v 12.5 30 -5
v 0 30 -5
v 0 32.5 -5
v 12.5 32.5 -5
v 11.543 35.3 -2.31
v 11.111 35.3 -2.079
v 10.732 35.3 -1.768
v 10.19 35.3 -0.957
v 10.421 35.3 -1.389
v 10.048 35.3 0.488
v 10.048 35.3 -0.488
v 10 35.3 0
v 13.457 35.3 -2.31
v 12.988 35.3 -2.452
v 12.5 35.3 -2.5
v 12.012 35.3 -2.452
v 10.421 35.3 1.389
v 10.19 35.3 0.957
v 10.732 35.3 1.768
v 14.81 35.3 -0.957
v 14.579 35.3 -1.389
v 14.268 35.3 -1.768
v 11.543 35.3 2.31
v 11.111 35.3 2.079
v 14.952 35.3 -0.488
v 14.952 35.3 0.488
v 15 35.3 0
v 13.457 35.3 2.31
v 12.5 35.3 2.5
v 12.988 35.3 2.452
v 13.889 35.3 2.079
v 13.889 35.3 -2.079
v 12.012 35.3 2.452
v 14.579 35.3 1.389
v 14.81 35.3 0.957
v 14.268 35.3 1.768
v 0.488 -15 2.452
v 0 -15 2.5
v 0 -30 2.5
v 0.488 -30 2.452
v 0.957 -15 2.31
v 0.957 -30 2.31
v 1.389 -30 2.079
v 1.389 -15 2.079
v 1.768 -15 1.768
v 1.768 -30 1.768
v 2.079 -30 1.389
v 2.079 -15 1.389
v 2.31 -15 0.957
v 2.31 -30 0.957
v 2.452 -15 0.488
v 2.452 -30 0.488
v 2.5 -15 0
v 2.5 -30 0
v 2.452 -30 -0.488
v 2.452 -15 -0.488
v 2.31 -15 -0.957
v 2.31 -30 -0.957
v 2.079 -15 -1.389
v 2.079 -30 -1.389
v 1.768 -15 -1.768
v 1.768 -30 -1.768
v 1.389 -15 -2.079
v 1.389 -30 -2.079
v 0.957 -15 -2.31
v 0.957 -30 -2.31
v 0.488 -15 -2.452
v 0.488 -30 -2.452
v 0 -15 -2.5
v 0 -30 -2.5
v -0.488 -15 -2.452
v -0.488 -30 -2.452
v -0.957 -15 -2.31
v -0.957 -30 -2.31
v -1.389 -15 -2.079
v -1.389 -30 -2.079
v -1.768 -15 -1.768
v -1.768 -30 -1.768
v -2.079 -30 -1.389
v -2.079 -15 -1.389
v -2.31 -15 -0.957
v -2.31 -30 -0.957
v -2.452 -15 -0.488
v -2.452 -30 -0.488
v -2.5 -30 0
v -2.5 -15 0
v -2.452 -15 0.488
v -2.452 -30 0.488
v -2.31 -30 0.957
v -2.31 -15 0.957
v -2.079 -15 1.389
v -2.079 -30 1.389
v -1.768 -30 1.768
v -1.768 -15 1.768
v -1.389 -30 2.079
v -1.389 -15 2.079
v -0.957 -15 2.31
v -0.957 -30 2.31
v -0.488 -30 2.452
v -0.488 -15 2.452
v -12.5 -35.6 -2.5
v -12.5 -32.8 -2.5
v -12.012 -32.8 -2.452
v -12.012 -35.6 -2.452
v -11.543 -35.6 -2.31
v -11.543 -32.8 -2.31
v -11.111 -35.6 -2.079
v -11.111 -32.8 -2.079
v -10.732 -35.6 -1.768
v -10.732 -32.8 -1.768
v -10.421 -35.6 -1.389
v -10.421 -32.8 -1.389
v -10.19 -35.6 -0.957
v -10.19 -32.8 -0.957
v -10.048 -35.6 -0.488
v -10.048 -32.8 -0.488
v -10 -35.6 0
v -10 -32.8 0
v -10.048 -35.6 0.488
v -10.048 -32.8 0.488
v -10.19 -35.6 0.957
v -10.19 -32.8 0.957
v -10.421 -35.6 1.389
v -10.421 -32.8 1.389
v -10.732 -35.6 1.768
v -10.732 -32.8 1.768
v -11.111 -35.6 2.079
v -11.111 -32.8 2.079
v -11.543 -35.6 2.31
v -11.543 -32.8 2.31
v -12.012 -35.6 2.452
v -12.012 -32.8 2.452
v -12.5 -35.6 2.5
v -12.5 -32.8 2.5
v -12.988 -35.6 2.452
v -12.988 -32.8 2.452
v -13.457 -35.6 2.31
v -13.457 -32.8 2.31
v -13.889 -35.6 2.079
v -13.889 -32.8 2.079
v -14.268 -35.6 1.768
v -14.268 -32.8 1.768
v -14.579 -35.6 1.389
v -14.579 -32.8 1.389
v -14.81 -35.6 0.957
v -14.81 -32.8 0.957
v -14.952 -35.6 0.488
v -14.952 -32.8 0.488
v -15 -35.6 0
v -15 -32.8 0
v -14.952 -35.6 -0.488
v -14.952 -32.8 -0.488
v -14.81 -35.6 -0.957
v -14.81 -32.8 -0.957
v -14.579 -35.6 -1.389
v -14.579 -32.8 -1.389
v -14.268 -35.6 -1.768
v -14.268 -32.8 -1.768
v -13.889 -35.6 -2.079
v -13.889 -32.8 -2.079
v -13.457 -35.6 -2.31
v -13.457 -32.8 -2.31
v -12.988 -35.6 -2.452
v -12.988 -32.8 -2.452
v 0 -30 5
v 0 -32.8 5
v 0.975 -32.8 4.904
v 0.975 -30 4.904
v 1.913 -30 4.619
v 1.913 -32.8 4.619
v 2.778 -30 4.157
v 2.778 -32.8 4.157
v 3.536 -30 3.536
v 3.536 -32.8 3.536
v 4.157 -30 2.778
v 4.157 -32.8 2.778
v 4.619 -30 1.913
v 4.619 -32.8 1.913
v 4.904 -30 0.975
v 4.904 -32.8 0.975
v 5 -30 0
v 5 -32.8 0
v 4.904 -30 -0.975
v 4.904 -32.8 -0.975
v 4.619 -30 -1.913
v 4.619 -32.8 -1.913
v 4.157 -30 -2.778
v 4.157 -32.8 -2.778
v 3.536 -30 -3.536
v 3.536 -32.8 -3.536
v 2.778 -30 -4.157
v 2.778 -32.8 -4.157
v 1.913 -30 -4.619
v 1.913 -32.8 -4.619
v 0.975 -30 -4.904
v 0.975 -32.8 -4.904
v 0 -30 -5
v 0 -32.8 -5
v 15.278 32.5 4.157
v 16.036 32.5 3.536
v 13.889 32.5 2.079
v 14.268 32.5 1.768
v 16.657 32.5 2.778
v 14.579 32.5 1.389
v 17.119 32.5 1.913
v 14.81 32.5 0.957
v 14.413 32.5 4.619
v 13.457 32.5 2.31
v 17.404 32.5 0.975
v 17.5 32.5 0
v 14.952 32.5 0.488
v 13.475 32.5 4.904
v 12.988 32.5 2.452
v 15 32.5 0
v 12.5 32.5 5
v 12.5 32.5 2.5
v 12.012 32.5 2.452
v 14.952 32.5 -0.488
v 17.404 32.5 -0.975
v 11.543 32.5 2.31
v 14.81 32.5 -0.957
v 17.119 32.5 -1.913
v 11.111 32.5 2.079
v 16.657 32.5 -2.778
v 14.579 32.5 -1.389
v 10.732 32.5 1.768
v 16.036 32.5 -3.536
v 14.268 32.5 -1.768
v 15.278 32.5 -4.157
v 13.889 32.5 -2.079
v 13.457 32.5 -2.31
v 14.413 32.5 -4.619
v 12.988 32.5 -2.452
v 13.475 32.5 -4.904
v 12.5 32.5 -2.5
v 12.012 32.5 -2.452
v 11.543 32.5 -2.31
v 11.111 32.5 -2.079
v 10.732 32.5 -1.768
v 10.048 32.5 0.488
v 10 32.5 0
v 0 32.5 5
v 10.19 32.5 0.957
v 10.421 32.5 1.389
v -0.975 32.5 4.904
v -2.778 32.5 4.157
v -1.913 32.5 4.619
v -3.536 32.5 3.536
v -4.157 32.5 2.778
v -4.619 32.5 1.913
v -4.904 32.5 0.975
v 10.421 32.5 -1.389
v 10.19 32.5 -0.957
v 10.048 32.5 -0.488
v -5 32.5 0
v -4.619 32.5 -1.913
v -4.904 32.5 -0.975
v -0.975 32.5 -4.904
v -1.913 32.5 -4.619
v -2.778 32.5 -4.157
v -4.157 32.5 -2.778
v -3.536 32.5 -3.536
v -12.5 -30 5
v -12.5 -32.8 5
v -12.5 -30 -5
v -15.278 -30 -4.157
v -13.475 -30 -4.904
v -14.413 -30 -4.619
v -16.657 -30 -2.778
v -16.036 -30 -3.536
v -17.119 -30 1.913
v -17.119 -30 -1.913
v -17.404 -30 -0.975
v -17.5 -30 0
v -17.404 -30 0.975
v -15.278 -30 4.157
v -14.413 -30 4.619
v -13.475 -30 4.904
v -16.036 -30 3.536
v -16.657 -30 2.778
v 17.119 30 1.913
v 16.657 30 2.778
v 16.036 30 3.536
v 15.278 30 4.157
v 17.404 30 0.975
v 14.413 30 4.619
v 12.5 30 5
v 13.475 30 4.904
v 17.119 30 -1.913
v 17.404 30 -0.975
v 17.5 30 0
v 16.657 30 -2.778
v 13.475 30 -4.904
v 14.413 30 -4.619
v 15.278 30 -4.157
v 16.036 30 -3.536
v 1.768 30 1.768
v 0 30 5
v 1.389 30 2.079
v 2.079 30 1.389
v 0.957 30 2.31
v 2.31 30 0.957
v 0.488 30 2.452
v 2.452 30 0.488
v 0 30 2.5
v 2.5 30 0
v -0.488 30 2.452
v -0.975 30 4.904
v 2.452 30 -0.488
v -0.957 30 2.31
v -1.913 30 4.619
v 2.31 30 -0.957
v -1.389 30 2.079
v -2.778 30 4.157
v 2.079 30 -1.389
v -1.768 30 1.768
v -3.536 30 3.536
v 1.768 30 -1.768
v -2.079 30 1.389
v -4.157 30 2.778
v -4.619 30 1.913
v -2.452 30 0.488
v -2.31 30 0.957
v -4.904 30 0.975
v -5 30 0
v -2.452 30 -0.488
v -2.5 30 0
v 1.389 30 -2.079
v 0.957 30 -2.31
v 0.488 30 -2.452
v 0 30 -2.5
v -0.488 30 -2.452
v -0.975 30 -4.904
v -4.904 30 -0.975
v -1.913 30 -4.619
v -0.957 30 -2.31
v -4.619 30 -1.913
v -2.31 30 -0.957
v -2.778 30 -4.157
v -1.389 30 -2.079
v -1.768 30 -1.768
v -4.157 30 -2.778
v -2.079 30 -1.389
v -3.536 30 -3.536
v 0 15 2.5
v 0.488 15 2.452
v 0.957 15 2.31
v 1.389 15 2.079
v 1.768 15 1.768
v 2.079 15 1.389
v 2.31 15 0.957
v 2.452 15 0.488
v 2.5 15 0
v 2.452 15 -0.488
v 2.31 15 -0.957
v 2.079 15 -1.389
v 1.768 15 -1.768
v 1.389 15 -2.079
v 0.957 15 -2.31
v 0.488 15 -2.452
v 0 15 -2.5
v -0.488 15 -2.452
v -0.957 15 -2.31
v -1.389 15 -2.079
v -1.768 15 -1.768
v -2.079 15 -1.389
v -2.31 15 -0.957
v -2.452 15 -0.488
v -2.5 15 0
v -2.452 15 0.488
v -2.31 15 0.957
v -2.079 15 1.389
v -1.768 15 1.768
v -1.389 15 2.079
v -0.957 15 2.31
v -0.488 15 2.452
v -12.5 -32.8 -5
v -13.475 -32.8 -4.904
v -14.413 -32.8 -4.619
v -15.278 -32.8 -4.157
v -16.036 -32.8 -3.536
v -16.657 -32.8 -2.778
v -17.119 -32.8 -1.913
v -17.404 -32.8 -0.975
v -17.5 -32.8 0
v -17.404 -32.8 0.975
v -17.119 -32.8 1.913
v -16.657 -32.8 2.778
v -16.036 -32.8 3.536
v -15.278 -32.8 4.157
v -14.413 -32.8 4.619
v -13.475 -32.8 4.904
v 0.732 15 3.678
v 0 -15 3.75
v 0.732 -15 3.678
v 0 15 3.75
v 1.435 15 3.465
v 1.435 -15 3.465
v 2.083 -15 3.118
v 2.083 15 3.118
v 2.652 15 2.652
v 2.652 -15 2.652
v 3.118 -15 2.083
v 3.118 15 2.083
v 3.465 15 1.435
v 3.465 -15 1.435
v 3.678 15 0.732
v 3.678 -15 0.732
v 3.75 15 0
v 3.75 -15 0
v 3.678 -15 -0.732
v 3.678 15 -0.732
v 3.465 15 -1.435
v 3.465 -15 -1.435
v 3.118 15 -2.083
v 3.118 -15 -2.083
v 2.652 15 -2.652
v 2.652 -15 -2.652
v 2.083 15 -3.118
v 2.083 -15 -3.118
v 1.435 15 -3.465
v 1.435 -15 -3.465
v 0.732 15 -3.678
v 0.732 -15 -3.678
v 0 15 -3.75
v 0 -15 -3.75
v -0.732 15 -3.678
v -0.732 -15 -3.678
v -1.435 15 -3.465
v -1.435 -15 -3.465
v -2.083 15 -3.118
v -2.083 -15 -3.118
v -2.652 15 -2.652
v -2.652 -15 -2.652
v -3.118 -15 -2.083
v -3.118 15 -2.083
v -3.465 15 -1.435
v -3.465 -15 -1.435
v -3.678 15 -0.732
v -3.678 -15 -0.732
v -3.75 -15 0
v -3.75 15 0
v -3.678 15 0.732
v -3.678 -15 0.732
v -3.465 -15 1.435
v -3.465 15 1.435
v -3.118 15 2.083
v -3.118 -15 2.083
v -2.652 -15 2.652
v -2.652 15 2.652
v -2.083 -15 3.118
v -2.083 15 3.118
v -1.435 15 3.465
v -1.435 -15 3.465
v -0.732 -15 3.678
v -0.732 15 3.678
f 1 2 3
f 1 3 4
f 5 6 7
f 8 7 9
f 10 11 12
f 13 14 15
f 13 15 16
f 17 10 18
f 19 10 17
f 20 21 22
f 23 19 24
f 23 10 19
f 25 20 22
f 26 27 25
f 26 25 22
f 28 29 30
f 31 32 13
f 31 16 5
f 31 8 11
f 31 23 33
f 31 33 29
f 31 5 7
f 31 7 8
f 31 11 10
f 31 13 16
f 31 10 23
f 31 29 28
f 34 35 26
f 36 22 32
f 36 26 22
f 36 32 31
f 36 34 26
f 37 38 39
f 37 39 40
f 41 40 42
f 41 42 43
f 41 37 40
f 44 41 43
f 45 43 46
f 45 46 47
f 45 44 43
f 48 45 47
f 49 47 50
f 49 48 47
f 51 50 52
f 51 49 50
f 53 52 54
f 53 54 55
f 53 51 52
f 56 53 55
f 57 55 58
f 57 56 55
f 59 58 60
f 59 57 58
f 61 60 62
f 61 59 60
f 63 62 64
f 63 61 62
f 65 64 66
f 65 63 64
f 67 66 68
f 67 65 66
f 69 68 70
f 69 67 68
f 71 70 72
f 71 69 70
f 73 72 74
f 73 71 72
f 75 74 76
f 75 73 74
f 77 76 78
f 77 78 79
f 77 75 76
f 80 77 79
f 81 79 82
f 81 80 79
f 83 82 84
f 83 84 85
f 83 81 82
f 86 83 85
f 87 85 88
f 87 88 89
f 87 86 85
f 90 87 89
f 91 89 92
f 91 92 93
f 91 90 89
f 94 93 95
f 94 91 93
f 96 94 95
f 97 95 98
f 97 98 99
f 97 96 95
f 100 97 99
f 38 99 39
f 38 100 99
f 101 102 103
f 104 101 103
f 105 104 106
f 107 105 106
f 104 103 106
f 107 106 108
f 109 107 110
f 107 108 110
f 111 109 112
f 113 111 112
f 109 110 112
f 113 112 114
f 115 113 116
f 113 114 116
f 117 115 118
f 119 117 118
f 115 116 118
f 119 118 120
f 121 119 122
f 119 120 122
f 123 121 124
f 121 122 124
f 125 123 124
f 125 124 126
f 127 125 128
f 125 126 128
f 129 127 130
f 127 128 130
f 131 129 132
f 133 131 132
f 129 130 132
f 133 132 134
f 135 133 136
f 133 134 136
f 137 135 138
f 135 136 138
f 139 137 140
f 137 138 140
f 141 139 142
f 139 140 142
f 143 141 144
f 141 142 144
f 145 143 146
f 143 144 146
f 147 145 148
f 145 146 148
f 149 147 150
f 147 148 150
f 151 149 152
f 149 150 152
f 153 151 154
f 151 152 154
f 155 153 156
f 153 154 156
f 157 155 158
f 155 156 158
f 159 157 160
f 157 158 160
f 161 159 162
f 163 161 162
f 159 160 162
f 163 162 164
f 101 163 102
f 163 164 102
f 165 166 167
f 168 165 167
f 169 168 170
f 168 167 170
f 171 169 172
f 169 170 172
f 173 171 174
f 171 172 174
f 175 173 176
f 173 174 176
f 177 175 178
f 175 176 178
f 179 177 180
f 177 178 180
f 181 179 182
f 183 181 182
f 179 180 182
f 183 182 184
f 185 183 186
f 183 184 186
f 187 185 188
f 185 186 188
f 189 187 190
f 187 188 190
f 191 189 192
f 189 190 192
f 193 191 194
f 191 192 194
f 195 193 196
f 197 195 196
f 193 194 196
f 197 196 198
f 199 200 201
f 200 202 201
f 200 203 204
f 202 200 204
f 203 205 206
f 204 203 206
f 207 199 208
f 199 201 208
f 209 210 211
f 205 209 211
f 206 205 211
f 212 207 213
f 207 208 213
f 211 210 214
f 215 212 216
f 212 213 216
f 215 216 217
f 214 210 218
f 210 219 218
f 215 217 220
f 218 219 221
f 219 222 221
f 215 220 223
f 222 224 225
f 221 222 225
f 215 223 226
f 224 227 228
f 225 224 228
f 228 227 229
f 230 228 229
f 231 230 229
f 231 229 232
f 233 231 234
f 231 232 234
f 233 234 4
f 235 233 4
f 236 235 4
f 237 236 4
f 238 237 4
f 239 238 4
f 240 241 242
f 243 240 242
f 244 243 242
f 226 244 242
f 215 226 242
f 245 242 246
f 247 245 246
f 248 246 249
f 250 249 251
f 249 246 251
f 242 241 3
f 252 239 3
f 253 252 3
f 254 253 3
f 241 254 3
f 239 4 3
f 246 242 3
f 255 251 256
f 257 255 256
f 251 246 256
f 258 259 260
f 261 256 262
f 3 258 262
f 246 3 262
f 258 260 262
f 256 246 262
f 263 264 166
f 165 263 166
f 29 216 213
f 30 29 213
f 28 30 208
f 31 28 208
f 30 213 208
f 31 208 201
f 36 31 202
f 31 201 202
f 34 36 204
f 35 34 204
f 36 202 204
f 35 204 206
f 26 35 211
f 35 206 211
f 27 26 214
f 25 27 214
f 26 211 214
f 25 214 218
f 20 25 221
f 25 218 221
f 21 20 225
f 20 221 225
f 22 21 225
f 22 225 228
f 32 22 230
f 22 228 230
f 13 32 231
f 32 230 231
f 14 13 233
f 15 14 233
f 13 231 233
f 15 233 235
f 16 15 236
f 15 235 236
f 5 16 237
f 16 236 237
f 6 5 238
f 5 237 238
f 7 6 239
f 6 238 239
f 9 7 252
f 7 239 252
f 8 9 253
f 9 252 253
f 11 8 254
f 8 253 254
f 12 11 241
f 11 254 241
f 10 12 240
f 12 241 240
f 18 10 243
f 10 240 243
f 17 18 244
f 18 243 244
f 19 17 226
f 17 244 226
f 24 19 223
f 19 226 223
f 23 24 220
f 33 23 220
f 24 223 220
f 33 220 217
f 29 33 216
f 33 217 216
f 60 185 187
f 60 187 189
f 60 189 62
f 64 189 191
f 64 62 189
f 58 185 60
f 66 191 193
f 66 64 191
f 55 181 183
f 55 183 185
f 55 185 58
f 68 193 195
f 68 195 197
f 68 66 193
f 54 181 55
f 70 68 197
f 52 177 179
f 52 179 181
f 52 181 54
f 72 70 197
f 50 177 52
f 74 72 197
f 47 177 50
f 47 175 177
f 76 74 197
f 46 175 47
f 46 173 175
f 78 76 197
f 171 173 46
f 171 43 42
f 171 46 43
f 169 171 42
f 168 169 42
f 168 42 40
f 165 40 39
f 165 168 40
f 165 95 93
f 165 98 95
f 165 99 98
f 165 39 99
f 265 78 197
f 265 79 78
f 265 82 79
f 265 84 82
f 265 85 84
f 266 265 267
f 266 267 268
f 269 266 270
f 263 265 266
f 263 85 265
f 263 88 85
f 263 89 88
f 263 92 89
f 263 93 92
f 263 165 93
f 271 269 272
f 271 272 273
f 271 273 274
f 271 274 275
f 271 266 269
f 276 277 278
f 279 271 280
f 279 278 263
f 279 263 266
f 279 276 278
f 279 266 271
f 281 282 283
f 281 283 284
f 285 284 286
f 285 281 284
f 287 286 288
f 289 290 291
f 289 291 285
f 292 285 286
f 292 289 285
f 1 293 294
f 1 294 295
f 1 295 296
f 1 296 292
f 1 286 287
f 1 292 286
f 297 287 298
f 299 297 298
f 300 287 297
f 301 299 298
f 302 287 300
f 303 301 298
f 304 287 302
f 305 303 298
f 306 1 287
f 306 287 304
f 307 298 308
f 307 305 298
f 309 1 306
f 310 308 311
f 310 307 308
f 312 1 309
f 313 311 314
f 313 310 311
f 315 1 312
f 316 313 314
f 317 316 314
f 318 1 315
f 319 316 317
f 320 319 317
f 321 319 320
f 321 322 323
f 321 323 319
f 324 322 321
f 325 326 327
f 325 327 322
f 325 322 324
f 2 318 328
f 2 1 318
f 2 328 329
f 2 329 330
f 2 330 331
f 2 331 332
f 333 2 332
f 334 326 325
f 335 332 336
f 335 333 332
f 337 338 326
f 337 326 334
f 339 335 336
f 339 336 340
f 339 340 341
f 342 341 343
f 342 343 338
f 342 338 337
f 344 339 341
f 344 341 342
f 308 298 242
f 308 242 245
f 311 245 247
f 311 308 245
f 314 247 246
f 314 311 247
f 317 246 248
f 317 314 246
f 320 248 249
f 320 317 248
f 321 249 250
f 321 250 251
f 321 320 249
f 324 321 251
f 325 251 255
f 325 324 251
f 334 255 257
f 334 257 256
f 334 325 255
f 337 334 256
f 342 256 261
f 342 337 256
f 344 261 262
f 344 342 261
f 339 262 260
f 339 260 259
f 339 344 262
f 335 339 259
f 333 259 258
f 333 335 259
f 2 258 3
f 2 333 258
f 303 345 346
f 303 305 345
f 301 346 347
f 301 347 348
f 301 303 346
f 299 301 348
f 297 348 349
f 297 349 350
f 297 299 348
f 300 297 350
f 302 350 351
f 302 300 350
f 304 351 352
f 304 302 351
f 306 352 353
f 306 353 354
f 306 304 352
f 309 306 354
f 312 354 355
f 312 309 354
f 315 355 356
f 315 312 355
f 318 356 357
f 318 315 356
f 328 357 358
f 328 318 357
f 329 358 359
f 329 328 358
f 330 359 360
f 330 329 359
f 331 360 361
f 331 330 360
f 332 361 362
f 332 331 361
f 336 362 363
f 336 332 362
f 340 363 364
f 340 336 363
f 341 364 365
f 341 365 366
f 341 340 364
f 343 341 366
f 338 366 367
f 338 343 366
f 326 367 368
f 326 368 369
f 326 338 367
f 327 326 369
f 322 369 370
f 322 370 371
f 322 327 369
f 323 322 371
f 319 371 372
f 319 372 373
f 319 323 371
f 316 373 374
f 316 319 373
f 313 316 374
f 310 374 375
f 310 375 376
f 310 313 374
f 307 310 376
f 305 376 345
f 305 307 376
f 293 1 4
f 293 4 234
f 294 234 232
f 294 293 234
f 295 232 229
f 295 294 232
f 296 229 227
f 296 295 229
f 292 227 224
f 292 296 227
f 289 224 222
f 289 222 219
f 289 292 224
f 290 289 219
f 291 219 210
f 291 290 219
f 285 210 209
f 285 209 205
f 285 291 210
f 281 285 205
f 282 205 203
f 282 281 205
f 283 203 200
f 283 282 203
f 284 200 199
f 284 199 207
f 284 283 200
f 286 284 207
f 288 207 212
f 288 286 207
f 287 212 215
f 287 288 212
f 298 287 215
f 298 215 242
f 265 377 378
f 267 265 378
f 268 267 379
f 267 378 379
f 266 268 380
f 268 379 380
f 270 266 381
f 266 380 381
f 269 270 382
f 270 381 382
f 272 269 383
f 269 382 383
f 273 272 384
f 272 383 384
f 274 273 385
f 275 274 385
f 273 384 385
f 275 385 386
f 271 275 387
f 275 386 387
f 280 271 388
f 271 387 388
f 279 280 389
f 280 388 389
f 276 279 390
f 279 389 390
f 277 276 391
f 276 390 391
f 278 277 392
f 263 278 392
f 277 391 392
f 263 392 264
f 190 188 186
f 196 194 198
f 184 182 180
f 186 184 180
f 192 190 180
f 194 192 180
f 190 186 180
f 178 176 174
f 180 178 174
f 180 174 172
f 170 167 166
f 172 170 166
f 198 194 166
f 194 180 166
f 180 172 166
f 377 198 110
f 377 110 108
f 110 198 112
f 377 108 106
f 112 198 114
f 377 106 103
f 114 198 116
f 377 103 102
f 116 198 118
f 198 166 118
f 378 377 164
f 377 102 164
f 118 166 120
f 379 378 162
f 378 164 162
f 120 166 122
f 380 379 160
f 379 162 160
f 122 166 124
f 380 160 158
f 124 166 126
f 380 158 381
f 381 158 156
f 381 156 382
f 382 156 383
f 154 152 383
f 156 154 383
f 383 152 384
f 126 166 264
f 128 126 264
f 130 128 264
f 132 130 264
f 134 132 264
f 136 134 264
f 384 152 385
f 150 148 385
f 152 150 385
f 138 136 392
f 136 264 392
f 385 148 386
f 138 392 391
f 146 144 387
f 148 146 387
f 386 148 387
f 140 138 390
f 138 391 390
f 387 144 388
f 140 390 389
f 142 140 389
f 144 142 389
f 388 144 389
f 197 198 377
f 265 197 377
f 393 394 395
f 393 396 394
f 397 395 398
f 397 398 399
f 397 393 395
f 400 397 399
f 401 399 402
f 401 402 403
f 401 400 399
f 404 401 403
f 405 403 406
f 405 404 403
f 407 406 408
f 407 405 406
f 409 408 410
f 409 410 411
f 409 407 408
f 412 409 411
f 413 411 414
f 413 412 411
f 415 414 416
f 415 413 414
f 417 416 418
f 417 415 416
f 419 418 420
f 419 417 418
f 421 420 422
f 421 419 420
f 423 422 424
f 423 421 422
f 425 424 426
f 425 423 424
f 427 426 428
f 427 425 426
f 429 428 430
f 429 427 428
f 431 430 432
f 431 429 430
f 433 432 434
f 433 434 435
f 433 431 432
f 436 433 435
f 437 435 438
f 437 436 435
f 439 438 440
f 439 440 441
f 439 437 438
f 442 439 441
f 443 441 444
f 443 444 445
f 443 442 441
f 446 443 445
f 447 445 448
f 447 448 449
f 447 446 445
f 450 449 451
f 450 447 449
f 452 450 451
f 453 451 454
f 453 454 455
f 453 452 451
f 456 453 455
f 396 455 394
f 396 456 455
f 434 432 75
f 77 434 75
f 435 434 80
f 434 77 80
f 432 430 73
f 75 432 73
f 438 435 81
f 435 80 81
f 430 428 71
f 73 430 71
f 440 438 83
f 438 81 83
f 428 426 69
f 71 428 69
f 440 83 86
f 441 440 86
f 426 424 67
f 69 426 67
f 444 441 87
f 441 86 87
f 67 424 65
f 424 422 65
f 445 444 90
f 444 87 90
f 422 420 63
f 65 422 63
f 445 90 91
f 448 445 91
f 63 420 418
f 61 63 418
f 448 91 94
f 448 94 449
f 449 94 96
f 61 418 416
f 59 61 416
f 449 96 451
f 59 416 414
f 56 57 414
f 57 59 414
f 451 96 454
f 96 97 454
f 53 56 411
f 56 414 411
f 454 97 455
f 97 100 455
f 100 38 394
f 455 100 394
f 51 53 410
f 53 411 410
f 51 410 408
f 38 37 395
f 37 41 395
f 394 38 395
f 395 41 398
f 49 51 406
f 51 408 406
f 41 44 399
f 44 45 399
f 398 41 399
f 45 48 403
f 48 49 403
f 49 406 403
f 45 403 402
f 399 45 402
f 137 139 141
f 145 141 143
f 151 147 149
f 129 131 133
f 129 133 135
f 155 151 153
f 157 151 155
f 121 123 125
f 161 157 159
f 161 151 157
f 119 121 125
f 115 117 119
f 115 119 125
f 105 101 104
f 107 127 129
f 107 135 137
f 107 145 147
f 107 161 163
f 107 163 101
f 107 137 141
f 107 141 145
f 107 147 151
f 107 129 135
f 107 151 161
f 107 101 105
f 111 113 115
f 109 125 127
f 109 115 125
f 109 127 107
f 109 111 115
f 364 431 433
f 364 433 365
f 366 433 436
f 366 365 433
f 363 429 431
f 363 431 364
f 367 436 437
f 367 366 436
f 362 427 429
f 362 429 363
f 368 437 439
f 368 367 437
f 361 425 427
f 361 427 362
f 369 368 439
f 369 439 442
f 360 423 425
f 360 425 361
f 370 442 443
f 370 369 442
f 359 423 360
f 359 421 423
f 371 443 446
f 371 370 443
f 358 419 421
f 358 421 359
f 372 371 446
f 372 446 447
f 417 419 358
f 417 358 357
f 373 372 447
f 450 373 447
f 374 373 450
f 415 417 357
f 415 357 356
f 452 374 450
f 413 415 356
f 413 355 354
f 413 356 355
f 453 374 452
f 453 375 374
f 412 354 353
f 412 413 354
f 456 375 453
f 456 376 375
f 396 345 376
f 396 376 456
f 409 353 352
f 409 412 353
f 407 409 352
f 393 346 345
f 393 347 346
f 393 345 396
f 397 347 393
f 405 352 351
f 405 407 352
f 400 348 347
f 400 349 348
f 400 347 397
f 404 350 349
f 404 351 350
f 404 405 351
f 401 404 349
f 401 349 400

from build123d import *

# Parameters (mm, degrees)
SKETCH1_R           = 2.5
BOSS_EXTRUDE1_DEPTH = 30
SKETCH6_R           = 3.75
BOSS_EXTRUDE6_DEPTH = 15
BOSS_EXTRUDE2_DEPTH = 2.5
SKETCH3_R           = 2.5
BOSS_EXTRUDE3_DEPTH = 2.8
BOSS_EXTRUDE4_START = 2.8
BOSS_EXTRUDE4_DEPTH = 2.8
SKETCH5_R           = 2.5
BOSS_EXTRUDE5_DEPTH = 2.8


with BuildPart() as part:
    # Sketch1 → Boss-Extrude1 (new, symmetric)
    with BuildSketch(Plane(origin=(0, 0, 0), x_dir=(1, 0, 0), z_dir=(0, 1, 0))):
        with Locations(Location((0, 0, 0), (0, 0, 270))):
            Circle(SKETCH1_R)
    extrude(amount=BOSS_EXTRUDE1_DEPTH, both=True)

    # Sketch6 → Boss-Extrude6 (add, symmetric)
    with BuildSketch(Plane(origin=(0, 0, 0), x_dir=(1, 0, 0), z_dir=(0, 1, 0))):
        with Locations(Location((0, 0, 0), (0, 0, 270))):
            Circle(SKETCH6_R)
    extrude(amount=BOSS_EXTRUDE6_DEPTH, both=True)

    # Sketch2 → Boss-Extrude2 (add)
    with BuildSketch(Plane(origin=(0, 30, 0), x_dir=(1, 0, 0), z_dir=(0, 1, 0))):
        with BuildLine():
            Line((0, 5), (12.5, 5))
            ThreePointArc((12.5, 5), (17.5, 0), (12.5, -5))
            Line((12.5, -5), (0, -5))
            ThreePointArc((0, -5), (-5, 0), (0, 5))
        make_face()
    extrude(amount=BOSS_EXTRUDE2_DEPTH)

    # Sketch3 → Boss-Extrude3 (add)
    with BuildSketch(Plane(origin=(0, 32.5, 0), x_dir=(1, 0, 0), z_dir=(0, 1, 0))):
        with Locations(Location((12.5, 0, 0), (0, 0, 270))):
            Circle(SKETCH3_R)
    extrude(amount=BOSS_EXTRUDE3_DEPTH)

    # Sketch4 → Boss-Extrude4 (add)
    with BuildSketch(Plane.XZ.offset(30).offset(BOSS_EXTRUDE4_START)):
        with BuildLine():
            Line((0, -5), (-12.5, -5))
            ThreePointArc((-12.5, -5), (-17.5, 0), (-12.5, 5))
            Line((-12.5, 5), (0, 5))
            ThreePointArc((0, 5), (5, 0), (0, -5))
        make_face()
    extrude(amount=-BOSS_EXTRUDE4_DEPTH)

    # Sketch5 → Boss-Extrude5 (add)
    with BuildSketch(Plane.XZ.offset(32.8)):
        with Locations(Location((-12.5, 0, 0), (0, 0, 270))):
            Circle(SKETCH5_R)
    extrude(amount=BOSS_EXTRUDE5_DEPTH)


solid = part.part
